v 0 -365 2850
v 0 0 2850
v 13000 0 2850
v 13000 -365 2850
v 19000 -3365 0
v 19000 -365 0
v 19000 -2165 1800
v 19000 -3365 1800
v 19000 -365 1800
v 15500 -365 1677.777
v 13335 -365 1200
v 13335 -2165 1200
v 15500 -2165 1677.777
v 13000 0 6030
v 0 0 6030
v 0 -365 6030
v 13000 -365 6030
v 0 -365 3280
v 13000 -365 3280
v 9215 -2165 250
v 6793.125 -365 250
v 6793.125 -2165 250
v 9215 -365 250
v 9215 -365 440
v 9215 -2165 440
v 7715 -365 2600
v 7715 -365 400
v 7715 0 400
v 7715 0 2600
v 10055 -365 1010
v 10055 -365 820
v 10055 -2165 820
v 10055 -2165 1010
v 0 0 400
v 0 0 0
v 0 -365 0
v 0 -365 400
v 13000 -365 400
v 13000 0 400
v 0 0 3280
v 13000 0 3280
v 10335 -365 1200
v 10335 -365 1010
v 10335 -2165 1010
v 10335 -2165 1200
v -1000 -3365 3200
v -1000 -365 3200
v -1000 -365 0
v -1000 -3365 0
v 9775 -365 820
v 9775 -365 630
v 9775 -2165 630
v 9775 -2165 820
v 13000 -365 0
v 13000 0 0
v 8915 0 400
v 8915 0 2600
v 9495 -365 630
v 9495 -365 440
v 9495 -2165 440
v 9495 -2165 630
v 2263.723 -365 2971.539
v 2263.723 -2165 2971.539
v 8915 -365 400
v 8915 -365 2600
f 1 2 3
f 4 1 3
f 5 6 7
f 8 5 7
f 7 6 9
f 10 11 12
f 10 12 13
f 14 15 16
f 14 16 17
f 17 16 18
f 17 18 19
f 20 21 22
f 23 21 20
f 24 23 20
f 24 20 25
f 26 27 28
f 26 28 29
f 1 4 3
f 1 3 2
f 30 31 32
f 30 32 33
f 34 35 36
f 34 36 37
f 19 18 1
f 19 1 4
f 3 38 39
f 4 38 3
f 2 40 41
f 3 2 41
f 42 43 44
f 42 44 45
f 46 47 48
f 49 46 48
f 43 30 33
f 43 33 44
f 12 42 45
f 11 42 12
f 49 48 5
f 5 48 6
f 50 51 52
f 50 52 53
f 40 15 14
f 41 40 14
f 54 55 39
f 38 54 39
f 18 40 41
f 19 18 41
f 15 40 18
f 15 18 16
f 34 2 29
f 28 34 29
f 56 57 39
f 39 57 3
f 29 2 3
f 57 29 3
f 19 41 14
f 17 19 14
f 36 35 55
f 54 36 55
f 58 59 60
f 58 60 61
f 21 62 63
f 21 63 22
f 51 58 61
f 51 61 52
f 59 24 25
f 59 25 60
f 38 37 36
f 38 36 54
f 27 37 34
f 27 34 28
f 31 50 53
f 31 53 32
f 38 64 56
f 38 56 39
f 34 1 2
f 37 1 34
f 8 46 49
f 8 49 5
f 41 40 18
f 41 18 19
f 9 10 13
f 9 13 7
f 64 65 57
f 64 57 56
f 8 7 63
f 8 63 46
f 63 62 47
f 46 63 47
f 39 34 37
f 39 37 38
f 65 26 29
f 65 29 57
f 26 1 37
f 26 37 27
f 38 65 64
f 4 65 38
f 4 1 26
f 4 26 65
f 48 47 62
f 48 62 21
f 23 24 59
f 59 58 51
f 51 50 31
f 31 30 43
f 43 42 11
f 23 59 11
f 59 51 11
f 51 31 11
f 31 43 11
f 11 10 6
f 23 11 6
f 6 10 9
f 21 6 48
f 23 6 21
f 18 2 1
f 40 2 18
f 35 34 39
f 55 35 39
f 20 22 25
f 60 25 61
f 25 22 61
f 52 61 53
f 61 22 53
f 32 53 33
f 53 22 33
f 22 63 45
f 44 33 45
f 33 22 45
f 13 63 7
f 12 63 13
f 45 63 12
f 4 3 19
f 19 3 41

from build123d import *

# Parameters (mm, degrees)
F0_W      = 13000
F0_H      = 400
F1_DEPTH  = 365
F3_DEPTH  = 365
F4_W      = 13000
F4_H      = 430
F5_DEPTH  = 365
F6_W      = 13000
F6_H      = 2750
F7_DEPTH  = 365
F9_DEPTH  = 3000
F11_DEPTH = 1800


with BuildPart() as f1:
    # F0 (on Front) → F1 (new body)
    with BuildSketch(Plane.XZ):
        with Locations((6500, 200)):
            Rectangle(F0_W, F0_H)
    extrude(amount=F1_DEPTH)


with BuildPart() as f3:
    # F2 (on face) → F3 (new body)
    with BuildSketch(Plane.XZ.offset(365)):
        Polygon((0, 2850), (0, 400), (7715, 400), (7715, 2600), (8915, 2600), (8915, 400), (13000, 400), (13000, 2850), align=None)
    extrude(amount=-F3_DEPTH)


with BuildPart() as f5:
    # F4 (on Front) → F5 (new body)
    with BuildSketch(Plane.XZ):
        with Locations((6500, 3065)):
            Rectangle(F4_W, F4_H)
    extrude(amount=F5_DEPTH)


with BuildPart() as f7:
    # F6 (on Front) → F7 (new body)
    with BuildSketch(Plane.XZ):
        with Locations((6500, 4655)):
            Rectangle(F6_W, F6_H)
    extrude(amount=F7_DEPTH)


with BuildPart() as f9:
    # F8 (on face) → F9 (new body)
    with BuildSketch(Plane.XZ.offset(365)):
        Polygon((19000, 1800), (-1000, 3200), (-1000, 0), (19000, 0), align=None)
    extrude(amount=F9_DEPTH)

    # F10 (on face) → F11 (cut)
    with BuildSketch(Plane.XZ.offset(365)):
        Polygon((19000, 3130), (2000, 3130), (6793.124909, 250), (9215, 250), (9215, 440), (9495, 440), (9495, 630), (9775, 630), (9775, 820), (10055, 820), (10055, 1010), (10335, 1010), (10335, 1200), (13335, 1200), (15500, 1677.777307), (19000, 1800), align=None)
    extrude(amount=F11_DEPTH, mode=Mode.SUBTRACT)


solid = Compound([f1.part, f3.part, f5.part, f7.part, f9.part])
